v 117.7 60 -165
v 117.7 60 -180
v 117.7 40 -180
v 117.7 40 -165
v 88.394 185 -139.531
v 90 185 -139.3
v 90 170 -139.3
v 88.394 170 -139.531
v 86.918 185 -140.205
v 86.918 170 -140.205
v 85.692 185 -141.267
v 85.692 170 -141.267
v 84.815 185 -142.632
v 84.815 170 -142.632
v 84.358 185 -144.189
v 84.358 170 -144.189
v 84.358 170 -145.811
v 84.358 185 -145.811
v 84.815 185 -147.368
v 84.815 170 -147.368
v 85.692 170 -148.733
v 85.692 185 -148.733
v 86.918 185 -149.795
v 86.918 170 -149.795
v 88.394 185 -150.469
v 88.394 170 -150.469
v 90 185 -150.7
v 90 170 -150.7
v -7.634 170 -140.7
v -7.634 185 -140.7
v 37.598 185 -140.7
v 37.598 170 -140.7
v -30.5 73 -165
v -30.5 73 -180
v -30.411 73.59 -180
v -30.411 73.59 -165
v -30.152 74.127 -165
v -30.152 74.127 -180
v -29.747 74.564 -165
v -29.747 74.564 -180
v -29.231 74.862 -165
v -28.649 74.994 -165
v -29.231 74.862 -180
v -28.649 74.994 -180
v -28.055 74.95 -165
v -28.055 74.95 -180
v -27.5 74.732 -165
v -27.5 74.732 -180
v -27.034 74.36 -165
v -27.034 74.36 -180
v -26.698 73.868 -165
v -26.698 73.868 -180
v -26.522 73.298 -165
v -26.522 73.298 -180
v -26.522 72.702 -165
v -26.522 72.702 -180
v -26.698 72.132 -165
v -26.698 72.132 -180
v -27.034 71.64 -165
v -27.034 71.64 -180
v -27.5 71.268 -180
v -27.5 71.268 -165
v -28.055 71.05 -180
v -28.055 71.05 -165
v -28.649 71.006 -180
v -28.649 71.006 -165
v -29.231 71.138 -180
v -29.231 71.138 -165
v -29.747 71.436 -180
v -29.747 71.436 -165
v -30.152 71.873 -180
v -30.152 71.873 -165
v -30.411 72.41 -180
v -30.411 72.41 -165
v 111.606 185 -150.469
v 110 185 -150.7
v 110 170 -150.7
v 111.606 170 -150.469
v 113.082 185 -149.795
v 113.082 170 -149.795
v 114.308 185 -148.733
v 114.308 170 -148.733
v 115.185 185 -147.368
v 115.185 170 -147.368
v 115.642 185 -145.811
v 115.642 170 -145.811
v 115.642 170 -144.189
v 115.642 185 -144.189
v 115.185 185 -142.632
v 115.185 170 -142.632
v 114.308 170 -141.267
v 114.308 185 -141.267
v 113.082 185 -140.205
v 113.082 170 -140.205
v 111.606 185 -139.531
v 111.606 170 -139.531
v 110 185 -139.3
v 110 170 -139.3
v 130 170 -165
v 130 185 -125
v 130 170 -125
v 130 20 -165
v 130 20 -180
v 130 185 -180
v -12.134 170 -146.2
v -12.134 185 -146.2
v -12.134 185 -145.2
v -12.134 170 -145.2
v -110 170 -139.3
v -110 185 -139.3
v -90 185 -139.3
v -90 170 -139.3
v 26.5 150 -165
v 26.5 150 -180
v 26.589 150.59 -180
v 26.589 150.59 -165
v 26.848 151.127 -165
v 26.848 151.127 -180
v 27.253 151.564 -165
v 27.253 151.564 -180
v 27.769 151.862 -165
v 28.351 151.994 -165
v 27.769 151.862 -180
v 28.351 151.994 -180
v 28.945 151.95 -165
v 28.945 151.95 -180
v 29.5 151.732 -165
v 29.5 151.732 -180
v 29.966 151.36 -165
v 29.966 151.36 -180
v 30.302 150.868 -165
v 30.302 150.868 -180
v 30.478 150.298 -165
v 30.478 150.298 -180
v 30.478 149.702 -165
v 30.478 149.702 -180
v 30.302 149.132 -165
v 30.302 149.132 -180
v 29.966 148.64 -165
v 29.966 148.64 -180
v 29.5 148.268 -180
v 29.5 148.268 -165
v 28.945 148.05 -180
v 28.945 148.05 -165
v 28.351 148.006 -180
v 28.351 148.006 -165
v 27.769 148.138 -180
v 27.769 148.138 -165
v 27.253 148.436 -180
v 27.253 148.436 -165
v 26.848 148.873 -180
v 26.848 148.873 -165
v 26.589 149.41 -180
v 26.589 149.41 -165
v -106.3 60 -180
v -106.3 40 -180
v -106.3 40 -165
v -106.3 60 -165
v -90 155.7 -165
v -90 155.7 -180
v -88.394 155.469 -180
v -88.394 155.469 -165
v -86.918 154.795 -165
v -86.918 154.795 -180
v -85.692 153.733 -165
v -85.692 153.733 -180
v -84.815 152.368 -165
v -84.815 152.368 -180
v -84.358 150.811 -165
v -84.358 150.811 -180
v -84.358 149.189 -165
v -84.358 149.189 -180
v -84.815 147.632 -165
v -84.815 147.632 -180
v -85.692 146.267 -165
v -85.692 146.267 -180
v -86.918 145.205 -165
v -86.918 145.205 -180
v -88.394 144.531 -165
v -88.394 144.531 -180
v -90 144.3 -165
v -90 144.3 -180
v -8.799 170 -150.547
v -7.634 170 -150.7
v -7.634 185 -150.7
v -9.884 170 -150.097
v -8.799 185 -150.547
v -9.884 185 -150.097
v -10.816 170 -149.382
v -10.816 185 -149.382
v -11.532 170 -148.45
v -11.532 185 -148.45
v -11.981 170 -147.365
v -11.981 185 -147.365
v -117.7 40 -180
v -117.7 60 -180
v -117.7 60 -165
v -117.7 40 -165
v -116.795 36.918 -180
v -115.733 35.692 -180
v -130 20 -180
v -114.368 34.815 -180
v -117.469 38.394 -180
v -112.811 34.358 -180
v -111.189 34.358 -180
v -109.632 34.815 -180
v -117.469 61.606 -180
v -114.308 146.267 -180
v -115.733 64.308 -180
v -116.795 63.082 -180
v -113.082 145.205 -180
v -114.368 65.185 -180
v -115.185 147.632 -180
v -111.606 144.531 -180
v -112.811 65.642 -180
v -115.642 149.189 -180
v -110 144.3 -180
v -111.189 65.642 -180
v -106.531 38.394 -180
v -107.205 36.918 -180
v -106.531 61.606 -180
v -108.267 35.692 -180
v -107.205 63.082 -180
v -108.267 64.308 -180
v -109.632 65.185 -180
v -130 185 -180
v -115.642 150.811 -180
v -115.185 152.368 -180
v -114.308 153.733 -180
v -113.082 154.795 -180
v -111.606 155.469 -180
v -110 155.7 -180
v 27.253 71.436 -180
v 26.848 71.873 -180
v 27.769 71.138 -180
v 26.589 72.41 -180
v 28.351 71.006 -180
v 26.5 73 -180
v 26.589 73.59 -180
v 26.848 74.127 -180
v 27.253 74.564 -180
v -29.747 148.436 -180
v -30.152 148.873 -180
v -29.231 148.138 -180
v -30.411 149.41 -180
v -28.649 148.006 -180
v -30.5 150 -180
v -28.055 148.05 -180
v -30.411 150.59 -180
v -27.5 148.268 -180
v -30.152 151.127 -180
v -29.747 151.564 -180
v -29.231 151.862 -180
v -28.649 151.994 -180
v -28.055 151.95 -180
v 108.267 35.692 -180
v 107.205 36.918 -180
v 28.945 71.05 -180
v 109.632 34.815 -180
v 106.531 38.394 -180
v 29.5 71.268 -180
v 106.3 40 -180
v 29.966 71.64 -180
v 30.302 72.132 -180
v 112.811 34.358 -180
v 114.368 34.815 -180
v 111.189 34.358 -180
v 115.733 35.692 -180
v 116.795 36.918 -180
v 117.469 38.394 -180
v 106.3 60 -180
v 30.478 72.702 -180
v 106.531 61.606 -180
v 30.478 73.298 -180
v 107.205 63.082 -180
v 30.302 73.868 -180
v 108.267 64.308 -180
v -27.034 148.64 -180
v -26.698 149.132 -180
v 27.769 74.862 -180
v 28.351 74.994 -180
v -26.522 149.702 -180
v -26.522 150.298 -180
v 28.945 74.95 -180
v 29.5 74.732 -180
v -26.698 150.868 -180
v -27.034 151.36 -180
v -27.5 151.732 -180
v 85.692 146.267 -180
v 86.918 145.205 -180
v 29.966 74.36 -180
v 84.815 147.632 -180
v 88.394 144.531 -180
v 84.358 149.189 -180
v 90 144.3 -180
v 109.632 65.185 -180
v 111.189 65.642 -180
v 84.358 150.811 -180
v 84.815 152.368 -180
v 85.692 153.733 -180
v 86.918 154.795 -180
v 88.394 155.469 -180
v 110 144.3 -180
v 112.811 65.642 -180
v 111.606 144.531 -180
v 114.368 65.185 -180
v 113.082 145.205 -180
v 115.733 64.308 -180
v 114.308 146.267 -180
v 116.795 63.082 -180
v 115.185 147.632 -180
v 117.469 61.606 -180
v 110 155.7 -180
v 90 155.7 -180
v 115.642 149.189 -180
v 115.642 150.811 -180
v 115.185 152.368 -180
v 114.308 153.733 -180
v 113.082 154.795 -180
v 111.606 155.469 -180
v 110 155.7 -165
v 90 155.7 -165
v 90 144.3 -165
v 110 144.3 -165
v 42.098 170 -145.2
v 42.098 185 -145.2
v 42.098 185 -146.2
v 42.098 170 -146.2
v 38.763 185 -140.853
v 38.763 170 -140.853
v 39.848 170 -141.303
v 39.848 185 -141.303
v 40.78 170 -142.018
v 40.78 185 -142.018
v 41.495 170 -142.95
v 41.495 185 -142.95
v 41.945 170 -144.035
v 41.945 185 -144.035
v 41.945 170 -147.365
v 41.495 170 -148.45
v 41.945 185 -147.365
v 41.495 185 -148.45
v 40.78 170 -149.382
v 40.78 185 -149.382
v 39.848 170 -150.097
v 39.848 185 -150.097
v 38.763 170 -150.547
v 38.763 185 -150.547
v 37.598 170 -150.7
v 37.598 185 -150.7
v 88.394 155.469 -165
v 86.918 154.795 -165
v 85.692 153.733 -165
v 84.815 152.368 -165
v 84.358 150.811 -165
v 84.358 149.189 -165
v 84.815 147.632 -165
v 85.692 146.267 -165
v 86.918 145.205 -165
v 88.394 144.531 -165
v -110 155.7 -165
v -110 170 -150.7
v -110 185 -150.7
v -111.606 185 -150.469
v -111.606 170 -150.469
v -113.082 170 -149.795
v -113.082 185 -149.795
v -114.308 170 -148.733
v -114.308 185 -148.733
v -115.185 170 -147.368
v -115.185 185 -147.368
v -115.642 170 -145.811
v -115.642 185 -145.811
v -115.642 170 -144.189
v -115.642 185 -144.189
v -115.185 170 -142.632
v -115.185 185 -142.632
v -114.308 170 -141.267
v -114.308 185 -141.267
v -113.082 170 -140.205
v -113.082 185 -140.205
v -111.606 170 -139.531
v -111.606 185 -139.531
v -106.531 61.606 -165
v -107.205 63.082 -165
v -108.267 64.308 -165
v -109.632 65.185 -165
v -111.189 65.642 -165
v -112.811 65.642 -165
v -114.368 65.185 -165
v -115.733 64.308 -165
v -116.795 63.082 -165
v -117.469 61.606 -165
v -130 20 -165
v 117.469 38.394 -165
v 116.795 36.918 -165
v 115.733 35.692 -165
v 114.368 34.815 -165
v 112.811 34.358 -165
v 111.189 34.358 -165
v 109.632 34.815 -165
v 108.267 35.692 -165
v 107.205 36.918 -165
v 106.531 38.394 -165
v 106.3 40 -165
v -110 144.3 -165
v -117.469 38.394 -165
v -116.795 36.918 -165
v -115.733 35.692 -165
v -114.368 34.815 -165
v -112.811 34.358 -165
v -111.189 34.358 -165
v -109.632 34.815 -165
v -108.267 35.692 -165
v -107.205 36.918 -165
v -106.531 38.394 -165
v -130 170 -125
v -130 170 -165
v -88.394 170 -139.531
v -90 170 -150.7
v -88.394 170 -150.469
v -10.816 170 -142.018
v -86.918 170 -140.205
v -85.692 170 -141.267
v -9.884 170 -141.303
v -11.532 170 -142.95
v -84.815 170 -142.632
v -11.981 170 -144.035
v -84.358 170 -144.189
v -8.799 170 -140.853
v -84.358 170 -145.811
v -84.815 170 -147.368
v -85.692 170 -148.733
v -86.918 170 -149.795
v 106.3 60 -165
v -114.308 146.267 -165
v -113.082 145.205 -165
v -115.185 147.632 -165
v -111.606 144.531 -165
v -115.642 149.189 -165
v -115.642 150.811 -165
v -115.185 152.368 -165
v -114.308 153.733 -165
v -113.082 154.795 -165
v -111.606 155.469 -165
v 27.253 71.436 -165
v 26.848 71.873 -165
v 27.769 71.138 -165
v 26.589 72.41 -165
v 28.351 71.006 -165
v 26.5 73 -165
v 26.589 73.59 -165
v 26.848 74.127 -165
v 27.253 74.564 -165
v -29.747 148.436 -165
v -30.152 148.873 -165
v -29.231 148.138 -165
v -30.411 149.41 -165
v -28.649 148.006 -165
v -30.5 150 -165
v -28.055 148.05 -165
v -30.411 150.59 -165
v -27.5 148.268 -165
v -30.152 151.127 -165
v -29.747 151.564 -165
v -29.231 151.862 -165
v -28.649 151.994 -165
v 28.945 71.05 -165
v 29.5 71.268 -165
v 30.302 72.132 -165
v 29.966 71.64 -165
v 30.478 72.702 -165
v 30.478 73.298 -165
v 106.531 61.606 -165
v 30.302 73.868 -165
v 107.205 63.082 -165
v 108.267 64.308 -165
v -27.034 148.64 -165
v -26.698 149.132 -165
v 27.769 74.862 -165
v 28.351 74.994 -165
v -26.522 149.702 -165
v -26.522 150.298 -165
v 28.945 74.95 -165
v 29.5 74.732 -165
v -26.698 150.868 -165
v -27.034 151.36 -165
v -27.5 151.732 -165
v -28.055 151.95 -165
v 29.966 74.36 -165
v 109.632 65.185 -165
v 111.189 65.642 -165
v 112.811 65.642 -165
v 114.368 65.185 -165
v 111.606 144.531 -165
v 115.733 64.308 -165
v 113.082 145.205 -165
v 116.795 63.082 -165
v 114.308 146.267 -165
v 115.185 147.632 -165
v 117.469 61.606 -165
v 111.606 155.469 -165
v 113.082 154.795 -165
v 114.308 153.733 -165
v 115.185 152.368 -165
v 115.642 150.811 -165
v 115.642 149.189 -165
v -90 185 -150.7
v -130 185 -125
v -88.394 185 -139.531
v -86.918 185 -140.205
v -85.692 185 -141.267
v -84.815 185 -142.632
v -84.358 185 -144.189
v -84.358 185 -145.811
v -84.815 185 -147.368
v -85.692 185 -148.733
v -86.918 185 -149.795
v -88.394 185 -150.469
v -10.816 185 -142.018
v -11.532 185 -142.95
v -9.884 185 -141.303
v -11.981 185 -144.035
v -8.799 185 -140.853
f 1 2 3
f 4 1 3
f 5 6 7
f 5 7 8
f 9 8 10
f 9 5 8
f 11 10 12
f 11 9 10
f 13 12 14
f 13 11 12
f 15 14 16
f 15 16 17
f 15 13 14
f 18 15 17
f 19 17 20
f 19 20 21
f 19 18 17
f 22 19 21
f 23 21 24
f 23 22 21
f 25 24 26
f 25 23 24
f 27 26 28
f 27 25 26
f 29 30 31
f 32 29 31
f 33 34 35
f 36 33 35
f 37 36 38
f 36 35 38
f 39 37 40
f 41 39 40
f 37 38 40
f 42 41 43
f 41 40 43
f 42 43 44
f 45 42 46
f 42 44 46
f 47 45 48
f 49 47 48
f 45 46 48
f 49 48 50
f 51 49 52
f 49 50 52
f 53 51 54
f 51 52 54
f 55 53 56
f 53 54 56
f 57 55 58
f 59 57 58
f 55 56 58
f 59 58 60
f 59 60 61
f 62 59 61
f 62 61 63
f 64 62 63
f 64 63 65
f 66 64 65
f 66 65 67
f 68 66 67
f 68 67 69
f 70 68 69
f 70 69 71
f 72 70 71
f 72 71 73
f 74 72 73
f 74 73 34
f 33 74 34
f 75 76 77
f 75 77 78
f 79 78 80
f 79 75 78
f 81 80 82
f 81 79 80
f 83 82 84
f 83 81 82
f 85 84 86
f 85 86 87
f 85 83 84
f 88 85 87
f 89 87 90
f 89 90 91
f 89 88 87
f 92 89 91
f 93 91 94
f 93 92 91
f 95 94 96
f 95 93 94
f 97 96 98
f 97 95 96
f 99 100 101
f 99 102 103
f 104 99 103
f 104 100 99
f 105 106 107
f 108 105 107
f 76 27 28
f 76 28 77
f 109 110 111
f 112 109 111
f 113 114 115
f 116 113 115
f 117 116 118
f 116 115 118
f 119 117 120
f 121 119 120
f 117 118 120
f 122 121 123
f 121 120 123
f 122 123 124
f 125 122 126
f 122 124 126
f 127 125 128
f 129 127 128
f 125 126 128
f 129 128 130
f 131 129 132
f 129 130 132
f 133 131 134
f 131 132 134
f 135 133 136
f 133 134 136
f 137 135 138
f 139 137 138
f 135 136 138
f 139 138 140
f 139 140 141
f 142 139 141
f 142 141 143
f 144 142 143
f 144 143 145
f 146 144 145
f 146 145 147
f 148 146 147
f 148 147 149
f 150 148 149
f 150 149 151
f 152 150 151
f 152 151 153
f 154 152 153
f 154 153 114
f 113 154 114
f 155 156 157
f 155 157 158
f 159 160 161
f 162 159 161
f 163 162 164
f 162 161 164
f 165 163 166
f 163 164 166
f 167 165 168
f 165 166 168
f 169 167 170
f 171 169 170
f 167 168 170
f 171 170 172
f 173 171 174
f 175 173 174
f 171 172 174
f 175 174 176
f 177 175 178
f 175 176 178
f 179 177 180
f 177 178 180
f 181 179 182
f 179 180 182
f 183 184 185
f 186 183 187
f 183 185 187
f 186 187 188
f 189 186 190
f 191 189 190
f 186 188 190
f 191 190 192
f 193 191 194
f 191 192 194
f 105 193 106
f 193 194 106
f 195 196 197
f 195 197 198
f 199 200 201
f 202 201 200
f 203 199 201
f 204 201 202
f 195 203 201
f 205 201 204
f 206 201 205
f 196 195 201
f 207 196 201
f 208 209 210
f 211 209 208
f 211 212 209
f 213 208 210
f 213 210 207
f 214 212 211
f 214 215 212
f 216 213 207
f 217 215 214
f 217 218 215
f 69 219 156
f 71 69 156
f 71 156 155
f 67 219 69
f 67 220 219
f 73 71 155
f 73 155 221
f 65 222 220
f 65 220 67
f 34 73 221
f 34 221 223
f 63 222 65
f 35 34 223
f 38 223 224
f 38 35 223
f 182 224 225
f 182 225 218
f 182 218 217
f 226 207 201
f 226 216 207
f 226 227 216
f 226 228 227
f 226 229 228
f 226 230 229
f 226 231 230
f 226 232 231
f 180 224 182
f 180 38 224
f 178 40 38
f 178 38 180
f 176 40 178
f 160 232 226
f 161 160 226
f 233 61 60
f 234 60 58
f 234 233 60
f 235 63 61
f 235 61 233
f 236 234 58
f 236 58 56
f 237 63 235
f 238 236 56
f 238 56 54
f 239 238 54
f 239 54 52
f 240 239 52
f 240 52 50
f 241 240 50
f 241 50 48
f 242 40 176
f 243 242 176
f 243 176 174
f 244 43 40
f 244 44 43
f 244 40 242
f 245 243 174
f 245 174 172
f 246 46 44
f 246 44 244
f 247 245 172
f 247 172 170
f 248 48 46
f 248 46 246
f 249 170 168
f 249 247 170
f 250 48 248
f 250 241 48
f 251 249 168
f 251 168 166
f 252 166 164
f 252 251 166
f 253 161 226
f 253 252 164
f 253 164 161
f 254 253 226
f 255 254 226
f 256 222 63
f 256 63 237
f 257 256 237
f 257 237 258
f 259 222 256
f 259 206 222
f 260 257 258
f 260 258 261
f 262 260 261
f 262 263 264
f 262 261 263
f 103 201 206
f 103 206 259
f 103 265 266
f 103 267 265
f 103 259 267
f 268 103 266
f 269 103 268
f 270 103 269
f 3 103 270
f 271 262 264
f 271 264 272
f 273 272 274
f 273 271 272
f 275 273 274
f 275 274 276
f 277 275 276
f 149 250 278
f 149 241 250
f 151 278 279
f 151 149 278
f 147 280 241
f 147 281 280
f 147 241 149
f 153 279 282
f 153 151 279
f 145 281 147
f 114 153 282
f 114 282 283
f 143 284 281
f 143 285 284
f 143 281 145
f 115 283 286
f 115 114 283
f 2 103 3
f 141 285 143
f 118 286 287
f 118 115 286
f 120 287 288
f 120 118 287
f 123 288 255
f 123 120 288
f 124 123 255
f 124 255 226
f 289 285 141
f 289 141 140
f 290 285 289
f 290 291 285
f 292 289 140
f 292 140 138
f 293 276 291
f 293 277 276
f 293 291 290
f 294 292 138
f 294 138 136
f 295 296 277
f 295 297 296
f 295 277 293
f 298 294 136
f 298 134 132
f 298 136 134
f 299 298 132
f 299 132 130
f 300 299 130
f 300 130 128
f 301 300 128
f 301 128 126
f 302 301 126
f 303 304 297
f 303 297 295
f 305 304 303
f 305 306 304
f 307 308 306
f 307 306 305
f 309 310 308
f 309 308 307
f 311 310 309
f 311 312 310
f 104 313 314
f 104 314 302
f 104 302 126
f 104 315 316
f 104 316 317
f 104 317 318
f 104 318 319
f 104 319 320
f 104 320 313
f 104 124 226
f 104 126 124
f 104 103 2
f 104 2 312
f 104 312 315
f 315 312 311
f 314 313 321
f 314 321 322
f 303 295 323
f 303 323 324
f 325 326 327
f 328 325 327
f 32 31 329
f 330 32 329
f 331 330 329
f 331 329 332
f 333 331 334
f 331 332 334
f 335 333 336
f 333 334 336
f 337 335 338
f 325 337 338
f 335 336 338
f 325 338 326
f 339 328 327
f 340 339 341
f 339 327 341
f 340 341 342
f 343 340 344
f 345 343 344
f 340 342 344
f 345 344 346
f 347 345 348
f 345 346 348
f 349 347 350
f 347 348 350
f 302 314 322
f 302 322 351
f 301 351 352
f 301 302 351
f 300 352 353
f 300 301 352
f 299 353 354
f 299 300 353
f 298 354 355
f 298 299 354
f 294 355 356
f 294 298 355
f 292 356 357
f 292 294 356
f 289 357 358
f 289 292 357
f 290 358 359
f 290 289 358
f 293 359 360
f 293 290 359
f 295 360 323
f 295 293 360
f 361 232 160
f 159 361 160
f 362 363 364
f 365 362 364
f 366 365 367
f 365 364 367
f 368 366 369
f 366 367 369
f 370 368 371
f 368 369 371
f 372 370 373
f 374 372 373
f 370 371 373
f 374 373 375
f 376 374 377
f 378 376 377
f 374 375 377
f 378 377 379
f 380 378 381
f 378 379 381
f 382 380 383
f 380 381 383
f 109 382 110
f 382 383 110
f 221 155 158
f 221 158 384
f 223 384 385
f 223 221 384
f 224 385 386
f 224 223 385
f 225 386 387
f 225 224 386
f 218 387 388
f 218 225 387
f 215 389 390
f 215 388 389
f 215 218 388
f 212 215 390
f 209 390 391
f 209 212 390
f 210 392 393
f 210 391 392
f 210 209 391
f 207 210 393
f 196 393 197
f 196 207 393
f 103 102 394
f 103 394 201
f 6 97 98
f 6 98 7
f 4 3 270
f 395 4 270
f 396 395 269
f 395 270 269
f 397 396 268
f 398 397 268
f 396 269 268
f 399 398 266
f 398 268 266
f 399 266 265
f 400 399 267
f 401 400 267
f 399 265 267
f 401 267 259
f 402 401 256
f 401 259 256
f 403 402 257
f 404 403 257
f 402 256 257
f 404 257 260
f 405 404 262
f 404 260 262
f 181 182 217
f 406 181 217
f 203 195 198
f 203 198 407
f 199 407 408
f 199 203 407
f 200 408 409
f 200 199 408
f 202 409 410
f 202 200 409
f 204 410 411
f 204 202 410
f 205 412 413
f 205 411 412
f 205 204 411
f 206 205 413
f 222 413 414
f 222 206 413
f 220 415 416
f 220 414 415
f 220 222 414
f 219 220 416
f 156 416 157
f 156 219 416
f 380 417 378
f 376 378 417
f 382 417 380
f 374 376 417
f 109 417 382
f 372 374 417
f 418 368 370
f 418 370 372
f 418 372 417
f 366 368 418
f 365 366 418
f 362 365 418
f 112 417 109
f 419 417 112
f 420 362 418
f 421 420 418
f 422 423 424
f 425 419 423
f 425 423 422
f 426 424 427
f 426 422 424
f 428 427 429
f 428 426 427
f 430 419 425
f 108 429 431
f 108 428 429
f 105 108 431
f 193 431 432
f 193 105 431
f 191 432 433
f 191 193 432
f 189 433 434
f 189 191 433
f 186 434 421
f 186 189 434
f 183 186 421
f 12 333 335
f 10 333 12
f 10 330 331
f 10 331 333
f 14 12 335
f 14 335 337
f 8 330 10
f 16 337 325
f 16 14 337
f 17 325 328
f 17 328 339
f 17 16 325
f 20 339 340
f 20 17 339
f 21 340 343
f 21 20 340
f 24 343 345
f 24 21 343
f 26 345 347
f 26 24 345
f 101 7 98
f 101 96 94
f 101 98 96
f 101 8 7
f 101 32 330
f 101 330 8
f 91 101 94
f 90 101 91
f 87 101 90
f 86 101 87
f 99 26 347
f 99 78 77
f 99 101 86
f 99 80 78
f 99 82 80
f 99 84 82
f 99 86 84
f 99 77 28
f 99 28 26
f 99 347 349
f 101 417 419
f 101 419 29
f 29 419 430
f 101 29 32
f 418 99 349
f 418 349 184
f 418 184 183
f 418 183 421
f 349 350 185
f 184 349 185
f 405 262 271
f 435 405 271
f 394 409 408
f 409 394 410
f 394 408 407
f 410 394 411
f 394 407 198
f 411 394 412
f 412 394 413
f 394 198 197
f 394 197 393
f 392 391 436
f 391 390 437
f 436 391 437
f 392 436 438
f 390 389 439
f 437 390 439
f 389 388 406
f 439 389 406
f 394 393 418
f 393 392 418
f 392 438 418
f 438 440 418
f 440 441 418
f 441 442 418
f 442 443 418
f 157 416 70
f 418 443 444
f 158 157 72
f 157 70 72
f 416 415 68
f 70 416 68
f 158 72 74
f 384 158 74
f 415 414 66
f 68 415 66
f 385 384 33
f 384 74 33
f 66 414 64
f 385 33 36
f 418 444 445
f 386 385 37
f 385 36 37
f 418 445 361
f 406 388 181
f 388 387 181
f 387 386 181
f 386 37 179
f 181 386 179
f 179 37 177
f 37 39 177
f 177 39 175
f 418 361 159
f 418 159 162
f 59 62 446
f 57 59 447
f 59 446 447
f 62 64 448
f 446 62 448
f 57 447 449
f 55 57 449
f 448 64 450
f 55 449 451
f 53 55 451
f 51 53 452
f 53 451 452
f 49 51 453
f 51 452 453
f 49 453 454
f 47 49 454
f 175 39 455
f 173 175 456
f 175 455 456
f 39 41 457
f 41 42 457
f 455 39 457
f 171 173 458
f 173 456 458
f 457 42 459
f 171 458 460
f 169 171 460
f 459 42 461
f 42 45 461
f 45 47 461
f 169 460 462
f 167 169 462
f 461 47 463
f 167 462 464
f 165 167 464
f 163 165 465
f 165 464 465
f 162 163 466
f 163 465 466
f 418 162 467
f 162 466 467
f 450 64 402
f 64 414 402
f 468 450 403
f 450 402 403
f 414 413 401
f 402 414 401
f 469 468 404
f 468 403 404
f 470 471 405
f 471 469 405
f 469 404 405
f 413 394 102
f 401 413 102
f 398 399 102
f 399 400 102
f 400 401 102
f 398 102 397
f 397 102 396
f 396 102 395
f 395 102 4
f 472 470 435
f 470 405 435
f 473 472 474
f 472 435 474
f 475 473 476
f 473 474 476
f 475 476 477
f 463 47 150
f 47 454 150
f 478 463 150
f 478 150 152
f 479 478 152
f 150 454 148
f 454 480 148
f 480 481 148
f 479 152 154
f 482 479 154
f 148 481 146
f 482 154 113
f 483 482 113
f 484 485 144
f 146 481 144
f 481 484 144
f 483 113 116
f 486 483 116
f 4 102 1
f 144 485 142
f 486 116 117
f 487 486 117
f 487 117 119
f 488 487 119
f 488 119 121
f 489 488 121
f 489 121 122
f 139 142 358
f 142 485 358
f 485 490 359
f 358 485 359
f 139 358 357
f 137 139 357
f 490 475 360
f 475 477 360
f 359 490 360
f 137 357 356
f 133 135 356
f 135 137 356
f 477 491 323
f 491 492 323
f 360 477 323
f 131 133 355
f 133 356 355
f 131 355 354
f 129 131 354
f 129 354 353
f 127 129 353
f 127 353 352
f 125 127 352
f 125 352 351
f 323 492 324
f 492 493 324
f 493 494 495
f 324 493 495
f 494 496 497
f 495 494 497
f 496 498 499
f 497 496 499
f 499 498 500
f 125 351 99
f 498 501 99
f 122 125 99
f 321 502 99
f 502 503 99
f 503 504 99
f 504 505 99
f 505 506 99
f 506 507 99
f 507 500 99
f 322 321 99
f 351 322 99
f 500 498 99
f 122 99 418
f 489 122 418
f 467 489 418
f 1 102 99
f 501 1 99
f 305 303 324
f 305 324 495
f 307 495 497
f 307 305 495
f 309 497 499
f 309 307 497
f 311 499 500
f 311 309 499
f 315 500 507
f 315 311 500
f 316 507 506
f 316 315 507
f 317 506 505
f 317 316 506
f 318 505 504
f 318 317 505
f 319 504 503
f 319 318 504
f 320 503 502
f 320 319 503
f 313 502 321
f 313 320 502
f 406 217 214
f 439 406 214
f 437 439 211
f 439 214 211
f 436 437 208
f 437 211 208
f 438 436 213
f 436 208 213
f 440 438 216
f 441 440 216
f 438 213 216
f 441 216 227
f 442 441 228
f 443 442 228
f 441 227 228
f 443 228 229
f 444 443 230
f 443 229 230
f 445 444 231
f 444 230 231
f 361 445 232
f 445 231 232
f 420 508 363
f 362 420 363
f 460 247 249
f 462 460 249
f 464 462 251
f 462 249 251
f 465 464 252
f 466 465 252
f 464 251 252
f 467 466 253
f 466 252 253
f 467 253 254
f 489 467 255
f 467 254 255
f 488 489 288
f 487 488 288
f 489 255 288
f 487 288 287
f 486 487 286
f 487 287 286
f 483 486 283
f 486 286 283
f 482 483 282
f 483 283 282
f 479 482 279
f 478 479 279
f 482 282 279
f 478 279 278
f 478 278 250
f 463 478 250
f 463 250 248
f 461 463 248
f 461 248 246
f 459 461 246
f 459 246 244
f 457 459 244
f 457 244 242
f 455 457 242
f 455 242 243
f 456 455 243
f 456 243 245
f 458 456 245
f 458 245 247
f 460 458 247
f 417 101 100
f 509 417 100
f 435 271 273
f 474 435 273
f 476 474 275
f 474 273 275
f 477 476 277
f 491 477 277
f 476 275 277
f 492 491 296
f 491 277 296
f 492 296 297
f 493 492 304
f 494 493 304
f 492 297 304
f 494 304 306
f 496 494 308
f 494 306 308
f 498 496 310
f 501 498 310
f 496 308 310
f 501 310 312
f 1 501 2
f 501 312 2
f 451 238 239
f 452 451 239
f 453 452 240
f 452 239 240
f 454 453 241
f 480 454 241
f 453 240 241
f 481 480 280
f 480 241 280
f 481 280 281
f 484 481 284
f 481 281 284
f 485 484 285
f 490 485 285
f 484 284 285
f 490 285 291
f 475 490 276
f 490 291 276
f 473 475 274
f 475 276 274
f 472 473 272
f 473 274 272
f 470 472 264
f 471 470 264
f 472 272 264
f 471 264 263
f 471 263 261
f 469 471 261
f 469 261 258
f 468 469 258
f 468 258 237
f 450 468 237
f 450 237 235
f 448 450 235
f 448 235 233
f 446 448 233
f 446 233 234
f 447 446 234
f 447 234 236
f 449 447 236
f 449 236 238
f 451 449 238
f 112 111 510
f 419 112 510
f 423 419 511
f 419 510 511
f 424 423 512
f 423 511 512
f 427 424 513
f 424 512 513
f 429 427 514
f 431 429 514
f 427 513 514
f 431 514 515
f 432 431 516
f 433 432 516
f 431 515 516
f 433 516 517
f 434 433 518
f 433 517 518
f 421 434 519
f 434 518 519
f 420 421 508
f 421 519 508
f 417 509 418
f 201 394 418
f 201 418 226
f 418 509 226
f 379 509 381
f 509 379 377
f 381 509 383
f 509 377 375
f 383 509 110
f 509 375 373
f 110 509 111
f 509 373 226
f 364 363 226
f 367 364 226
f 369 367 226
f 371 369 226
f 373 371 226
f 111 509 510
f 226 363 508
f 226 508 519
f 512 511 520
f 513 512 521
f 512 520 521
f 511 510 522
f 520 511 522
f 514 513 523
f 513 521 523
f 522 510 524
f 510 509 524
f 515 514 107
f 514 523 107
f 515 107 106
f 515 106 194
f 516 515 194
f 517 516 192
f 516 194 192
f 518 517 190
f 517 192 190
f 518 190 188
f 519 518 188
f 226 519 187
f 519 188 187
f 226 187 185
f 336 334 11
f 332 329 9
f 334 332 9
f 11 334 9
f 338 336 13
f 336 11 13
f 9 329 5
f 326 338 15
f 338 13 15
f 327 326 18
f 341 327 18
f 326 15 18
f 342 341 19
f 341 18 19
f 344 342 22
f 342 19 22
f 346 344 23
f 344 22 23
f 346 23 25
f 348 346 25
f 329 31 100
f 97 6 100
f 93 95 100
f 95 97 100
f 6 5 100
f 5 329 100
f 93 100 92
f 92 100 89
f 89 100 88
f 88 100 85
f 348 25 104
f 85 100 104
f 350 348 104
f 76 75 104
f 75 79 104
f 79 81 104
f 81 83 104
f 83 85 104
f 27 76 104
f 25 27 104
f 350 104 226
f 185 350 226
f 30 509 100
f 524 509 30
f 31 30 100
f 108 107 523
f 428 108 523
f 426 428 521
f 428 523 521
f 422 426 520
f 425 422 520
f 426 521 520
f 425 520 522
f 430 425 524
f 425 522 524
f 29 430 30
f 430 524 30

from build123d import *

# Parameters (mm, degrees)
SKETCH4_W          = 15
SKETCH4_H          = 150
MIDDLE_DEPTH       = 130
SKETCH10_R         = 2
MIDDLE_HOLES_DEPTH = 215.534379529
SKETCH11_W         = 55
SKETCH11_H         = 15
UPPER_DEPTH        = 130
UPPER_START        = 185
UPPER_HOLES_DEPTH  = 15
CUT_EXTRUDE1_DEPTH = 277.631523872


with BuildPart() as part:
    # Sketch4 → Middle (new, symmetric)
    with BuildSketch(Plane(origin=(0, 0, 0), x_dir=(0, 0, -1), z_dir=(1, 0, 0))):
        with Locations((172.5, 95)):
            Rectangle(SKETCH4_W, SKETCH4_H)
    extrude(amount=MIDDLE_DEPTH, both=True)

    # Sketch10 → Middle Holes (cut, through all)
    with BuildSketch(Plane(origin=(0, 0, -180), x_dir=(-1, 0, 0), z_dir=(0, 0, -1))):
        with Locations((-28.5, 150)):
            Circle(SKETCH10_R)
        with Locations((28.5, 150)):
            Circle(SKETCH10_R)
        with Locations((28.5, 73)):
            Circle(SKETCH10_R)
        with Locations((-28.5, 73)):
            Circle(SKETCH10_R)
        with BuildLine():
            Line((-110, 155.7), (-90, 155.7))
            ThreePointArc((-90, 155.7), (-84.3, 150), (-90, 144.3))
            Line((-90, 144.3), (-110, 144.3))
            ThreePointArc((-110, 144.3), (-115.7, 150), (-110, 155.7))
        make_face()
        with BuildLine():
            Line((90, 144.3), (110, 144.3))
            ThreePointArc((110, 144.3), (115.7, 150), (110, 155.7))
            Line((110, 155.7), (90, 155.7))
            ThreePointArc((90, 155.7), (84.3, 150), (90, 144.3))
        make_face()
        with BuildLine():
            Line((-117.7, 60), (-117.7, 40))
            ThreePointArc((-117.7, 40), (-112, 34.3), (-106.3, 40))
            Line((-106.3, 40), (-106.3, 60))
            ThreePointArc((-106.3, 60), (-112, 65.7), (-117.7, 60))
        make_face()
        with BuildLine():
            Line((106.3, 40), (106.3, 60))
            ThreePointArc((106.3, 60), (112, 65.7), (117.7, 60))
            Line((117.7, 60), (117.7, 40))
            ThreePointArc((117.7, 40), (112, 34.3), (106.3, 40))
        make_face()
    extrude(amount=-MIDDLE_HOLES_DEPTH, mode=Mode.SUBTRACT)

    # Sketch11 → Upper (add, symmetric)
    with BuildSketch(Plane(origin=(0, 0, 0), x_dir=(0, 0, -1), z_dir=(1, 0, 0))):
        with Locations((152.5, 177.5)):
            Rectangle(SKETCH11_W, SKETCH11_H)
    extrude(amount=UPPER_DEPTH, both=True)

    # Sketch12 → Upper Holes (cut)
    with BuildSketch(Plane(origin=(0, 0, 0), x_dir=(1, 0, 0), z_dir=(0, 1, 0)).offset(UPPER_START)):
        with BuildLine():
            Line((-110, 139.3), (-90, 139.3))
            ThreePointArc((-90, 139.3), (-84.3, 145), (-90, 150.7))
            Line((-90, 150.7), (-110, 150.7))
            ThreePointArc((-110, 150.7), (-115.7, 145), (-110, 139.3))
        make_face()
        with BuildLine():
            Line((110, 139.3), (90, 139.3))
            ThreePointArc((90, 139.3), (84.3, 145), (90, 150.7))
            Line((90, 150.7), (110, 150.7))
            ThreePointArc((110, 150.7), (115.7, 145), (110, 139.3))
        make_face()
    extrude(amount=-UPPER_HOLES_DEPTH, mode=Mode.SUBTRACT)

    # Sketch14 → Cut-Extrude1 (cut, through all)
    with BuildSketch(Plane(origin=(0, 185, 0), x_dir=(1, 0, 0), z_dir=(0, 1, 0))):
        with BuildLine():
            Line((42.098030274, 145.2), (42.098030274, 146.2))
            ThreePointArc((42.098030274, 146.2), (40.78001079, 149.381980515), (37.598030274, 150.7))
            Line((37.598030274, 150.7), (-7.634483759, 150.7))
            ThreePointArc((-7.634483759, 150.7), (-10.816464274, 149.381980515), (-12.134483759, 146.2))
            Line((-12.134483759, 146.2), (-12.134483759, 145.2))
            ThreePointArc((-12.134483759, 145.2), (-10.816464274, 142.018019485), (-7.634483759, 140.7))
            Line((-7.634483759, 140.7), (37.598030274, 140.7))
            ThreePointArc((37.598030274, 140.7), (40.78001079, 142.018019485), (42.098030274, 145.2))
        make_face()
    extrude(amount=-CUT_EXTRUDE1_DEPTH, mode=Mode.SUBTRACT)


solid = part.part
